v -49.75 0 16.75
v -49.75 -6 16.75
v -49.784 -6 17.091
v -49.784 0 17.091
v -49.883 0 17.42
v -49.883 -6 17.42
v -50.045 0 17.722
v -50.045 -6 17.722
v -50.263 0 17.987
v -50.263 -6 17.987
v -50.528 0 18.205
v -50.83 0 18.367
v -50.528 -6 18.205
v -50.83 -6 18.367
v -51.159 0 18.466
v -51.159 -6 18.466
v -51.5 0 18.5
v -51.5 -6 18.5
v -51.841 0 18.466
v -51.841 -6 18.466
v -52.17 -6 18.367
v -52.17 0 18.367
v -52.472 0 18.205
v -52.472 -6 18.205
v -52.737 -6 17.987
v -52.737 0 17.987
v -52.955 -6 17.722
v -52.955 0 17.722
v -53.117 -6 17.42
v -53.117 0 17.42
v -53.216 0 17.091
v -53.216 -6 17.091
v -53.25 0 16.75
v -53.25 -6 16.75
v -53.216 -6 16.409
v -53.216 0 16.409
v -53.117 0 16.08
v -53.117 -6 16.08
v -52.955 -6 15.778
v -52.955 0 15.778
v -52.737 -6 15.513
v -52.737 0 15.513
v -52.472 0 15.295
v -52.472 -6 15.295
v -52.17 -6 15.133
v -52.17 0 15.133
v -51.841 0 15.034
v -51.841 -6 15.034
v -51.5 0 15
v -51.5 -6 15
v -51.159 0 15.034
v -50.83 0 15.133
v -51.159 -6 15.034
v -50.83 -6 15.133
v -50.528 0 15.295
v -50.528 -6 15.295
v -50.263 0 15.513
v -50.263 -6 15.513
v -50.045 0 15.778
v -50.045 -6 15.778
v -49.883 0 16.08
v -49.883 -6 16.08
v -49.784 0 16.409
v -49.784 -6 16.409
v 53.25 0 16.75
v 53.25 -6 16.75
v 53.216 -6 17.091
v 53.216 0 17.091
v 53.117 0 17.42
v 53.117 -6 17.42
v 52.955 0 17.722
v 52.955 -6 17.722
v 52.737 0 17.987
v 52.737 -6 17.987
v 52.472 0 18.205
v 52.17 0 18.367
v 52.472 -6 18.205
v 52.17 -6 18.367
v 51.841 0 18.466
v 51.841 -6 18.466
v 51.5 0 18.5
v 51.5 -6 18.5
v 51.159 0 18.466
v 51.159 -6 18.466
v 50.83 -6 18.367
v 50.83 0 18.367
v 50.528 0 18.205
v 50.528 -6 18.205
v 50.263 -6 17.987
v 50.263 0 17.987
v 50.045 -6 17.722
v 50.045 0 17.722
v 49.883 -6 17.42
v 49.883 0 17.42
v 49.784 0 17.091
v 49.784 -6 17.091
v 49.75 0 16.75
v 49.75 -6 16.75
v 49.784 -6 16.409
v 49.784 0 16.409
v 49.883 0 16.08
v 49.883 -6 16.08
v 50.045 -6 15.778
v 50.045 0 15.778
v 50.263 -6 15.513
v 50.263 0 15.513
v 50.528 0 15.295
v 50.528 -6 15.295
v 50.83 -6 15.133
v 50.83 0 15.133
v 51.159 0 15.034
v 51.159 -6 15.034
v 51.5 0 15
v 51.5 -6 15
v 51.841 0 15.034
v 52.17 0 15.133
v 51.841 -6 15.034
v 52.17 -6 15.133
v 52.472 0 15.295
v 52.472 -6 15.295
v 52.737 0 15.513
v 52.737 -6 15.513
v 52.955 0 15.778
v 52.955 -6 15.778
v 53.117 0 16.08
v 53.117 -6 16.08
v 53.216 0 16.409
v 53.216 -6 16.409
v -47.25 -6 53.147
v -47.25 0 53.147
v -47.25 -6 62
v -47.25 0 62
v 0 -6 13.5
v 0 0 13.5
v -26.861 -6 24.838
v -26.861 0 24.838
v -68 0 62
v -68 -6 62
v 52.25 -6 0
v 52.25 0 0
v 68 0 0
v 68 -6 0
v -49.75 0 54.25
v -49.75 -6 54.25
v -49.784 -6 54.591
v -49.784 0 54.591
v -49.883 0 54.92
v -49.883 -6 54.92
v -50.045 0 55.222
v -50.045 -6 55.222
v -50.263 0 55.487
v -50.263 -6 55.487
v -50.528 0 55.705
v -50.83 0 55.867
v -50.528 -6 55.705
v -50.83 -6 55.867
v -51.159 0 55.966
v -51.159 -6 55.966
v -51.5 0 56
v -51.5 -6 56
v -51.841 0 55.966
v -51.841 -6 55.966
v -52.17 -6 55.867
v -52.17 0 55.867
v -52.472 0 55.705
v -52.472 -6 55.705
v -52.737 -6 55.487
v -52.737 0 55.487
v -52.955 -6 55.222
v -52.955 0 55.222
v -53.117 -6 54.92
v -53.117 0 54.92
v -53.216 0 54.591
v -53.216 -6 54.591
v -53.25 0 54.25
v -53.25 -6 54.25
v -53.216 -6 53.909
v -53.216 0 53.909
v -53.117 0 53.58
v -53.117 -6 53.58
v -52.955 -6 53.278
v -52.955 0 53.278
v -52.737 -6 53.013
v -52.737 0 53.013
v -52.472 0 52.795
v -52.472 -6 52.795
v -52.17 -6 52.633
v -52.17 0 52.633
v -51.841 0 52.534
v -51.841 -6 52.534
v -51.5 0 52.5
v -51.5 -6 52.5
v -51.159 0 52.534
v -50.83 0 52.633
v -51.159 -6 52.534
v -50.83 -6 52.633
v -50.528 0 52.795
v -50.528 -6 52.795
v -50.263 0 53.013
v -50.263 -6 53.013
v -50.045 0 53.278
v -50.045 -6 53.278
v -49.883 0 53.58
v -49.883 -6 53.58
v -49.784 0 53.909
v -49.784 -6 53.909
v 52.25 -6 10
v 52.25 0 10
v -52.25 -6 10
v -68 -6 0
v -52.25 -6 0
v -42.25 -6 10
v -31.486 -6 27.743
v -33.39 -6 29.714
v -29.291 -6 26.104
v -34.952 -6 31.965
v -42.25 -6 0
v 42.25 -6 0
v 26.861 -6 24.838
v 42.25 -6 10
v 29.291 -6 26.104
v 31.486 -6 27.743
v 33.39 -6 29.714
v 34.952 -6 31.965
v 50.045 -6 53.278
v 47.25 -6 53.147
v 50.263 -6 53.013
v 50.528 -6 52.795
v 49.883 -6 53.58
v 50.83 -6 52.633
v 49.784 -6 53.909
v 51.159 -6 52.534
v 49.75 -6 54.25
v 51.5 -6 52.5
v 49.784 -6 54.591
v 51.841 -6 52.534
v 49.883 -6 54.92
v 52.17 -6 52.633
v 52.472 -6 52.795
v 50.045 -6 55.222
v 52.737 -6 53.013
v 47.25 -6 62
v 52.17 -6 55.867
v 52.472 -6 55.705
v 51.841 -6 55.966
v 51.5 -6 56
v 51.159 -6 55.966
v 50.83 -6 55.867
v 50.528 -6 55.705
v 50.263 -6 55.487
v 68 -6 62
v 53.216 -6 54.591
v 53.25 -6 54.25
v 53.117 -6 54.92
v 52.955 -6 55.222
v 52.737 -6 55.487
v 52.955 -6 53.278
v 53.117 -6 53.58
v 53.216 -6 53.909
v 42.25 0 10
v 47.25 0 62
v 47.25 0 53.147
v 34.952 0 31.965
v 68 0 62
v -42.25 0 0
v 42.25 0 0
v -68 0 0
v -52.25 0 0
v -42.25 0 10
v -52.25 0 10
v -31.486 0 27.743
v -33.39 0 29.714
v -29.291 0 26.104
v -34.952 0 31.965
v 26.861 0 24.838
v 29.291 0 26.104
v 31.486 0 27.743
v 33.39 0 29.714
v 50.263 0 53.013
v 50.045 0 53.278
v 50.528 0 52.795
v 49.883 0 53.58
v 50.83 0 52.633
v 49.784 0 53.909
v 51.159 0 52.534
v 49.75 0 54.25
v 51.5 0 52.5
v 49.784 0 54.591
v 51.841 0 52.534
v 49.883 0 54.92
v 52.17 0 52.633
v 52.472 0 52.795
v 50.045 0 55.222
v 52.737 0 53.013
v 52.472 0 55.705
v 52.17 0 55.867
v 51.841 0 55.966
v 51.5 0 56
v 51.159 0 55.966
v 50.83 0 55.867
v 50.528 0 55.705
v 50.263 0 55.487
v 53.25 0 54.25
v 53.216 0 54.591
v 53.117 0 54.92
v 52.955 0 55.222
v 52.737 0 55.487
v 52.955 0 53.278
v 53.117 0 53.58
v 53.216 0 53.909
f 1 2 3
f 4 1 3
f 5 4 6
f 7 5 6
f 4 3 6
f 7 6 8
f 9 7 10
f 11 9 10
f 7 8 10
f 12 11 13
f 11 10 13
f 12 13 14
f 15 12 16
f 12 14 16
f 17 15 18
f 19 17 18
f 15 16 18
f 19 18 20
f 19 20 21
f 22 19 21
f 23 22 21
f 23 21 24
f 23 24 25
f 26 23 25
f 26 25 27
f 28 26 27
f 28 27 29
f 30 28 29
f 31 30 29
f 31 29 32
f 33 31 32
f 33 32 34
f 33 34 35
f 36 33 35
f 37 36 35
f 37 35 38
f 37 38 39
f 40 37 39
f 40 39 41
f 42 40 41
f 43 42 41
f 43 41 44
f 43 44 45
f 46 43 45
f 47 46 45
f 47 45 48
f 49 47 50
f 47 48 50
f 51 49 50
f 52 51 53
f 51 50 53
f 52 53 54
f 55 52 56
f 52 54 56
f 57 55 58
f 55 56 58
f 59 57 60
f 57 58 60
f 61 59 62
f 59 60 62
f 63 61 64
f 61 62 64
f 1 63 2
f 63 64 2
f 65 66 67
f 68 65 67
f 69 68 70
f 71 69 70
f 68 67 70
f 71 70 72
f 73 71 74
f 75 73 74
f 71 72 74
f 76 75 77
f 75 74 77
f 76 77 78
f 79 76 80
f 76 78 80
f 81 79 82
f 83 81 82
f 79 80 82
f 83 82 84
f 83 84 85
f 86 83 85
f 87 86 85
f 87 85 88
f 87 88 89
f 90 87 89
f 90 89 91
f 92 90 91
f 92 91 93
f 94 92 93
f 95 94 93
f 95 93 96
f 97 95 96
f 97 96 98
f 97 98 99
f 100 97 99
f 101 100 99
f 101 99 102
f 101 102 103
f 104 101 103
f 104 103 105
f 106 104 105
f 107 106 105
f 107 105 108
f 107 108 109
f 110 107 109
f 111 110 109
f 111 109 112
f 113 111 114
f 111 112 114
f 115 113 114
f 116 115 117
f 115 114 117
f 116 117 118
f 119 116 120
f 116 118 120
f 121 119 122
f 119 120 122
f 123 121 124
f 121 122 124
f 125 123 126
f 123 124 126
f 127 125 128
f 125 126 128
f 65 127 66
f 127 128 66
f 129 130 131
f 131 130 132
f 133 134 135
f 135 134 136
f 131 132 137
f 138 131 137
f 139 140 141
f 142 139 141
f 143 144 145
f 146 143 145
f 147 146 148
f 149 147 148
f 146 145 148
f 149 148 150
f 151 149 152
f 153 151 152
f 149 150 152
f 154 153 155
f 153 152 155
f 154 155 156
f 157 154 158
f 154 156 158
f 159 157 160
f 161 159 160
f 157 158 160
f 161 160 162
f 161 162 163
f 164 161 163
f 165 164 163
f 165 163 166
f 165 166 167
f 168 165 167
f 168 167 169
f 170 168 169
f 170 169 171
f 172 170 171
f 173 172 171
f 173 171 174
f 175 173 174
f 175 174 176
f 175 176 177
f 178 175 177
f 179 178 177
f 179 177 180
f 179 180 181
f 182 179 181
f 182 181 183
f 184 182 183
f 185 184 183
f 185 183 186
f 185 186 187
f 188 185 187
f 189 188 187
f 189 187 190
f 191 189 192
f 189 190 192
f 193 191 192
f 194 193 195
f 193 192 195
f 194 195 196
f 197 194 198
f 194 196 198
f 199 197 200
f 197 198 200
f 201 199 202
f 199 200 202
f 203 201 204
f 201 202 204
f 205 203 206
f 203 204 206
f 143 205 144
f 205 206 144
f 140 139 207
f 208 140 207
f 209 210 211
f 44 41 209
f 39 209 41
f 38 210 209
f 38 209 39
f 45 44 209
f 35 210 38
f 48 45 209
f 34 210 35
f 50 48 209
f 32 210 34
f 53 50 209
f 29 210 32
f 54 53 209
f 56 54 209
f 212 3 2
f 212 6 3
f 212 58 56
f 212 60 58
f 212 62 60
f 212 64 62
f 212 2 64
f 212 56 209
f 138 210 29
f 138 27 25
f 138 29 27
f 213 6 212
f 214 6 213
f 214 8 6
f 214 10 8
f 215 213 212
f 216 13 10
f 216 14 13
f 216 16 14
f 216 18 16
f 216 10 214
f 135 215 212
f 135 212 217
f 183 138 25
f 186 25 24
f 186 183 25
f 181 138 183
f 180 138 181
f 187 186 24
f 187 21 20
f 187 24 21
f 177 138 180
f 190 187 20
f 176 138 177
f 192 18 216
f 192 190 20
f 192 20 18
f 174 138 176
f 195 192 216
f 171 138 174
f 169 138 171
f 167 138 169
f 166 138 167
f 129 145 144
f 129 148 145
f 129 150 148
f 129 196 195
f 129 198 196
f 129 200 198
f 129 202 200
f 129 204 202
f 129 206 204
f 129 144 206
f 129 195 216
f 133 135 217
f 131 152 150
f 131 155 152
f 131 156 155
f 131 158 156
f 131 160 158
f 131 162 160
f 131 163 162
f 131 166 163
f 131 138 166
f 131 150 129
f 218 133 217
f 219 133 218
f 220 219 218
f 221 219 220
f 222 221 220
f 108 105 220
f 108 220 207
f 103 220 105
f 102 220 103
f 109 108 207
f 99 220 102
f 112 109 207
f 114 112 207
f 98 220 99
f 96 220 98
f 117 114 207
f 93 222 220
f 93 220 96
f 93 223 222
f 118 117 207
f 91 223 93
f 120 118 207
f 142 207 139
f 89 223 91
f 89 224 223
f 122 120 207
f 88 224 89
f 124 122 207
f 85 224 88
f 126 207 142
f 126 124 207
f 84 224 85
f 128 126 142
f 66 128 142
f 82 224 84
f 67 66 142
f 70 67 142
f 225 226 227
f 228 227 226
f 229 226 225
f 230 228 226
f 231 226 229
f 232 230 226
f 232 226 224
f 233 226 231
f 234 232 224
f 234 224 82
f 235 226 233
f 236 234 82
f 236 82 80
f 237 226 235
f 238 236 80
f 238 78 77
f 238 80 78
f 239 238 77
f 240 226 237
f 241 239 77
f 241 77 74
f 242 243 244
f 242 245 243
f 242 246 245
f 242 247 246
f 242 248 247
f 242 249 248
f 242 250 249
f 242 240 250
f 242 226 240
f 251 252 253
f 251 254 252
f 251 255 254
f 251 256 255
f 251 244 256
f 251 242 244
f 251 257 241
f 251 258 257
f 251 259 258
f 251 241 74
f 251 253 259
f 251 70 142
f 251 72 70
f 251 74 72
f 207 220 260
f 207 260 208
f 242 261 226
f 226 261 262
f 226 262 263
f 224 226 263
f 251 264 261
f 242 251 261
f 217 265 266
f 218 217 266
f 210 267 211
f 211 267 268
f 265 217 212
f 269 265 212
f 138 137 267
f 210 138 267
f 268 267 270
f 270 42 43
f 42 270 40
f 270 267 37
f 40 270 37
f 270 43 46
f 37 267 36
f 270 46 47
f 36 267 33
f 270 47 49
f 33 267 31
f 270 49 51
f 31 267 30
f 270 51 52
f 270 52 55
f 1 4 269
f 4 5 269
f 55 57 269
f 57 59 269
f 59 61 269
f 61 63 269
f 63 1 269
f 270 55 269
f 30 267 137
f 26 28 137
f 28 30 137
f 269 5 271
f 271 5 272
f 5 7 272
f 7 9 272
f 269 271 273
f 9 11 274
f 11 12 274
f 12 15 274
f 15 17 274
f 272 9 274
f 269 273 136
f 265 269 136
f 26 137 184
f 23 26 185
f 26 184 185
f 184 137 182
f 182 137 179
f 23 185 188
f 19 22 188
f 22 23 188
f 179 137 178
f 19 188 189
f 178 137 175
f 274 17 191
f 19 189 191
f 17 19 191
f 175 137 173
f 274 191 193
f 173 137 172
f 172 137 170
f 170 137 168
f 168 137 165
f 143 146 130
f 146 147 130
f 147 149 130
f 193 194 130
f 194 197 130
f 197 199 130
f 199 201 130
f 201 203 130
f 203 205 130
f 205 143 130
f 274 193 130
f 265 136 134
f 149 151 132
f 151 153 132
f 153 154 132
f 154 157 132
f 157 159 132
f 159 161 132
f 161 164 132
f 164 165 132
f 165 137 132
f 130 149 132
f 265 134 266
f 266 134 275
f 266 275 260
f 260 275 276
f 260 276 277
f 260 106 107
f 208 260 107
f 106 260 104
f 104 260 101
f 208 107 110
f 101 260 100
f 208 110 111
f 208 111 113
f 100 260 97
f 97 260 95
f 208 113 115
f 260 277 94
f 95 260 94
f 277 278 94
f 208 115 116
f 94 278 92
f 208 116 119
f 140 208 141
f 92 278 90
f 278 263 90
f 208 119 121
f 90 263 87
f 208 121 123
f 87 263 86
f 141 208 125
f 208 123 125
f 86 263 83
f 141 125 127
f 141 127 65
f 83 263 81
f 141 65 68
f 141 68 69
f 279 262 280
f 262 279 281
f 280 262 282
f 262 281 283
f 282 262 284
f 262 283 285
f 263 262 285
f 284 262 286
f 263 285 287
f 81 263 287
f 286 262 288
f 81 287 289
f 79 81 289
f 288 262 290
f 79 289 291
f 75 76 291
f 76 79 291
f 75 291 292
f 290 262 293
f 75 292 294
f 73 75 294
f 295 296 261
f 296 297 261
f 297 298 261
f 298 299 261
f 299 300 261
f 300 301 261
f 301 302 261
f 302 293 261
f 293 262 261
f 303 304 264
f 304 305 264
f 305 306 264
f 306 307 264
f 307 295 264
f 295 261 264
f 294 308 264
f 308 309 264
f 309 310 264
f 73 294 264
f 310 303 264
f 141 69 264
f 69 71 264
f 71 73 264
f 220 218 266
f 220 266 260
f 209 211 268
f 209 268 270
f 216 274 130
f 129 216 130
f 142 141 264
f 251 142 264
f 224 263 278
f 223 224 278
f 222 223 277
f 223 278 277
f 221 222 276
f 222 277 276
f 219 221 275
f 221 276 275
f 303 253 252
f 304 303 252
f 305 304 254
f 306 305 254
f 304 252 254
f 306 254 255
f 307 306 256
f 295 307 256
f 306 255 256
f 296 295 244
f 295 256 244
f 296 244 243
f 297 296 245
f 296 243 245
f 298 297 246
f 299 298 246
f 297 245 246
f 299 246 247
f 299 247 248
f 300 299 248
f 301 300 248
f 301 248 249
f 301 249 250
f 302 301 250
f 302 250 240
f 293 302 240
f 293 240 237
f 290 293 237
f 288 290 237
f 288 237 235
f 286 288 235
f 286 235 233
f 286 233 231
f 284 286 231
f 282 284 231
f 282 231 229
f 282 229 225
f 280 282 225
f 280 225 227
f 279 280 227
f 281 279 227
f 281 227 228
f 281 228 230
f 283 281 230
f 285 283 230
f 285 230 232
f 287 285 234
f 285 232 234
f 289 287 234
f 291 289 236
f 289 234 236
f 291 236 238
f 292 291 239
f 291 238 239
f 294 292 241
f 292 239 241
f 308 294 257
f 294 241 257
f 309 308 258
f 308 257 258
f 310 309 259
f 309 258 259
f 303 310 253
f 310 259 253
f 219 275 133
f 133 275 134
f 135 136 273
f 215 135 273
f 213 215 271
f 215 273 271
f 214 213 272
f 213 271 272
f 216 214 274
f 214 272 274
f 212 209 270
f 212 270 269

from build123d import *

# Parameters (mm, degrees)
F1_DEPTH = 6
F2_R     = 1.75
F3_DEPTH = 6.001
F4_W     = 10
F4_H     = 10
F5_DEPTH = 6.001


with BuildPart() as f1:
    # F0 (on Front) → F1 (new body)
    with BuildSketch(Plane.XZ):
        with BuildLine():
            Line((-68, 0), (0, 0))
            Line((0, 0), (68, 0))
            Line((68, 0), (68, 62))
            Line((68, 62), (47.25, 62))
            Line((47.25, 62), (47.25, 53.147458))
            Line((47.25, 53.147458), (34.951913, 31.964558))
            ThreePointArc((34.951913, 31.964558), (31.486373, 27.742888), (26.860942, 24.838089))
            Line((26.860942, 24.838089), (0, 13.5))
            Line((0, 13.5), (-26.860942, 24.838089))
            ThreePointArc((-26.860942, 24.838089), (-31.486373, 27.742888), (-34.951913, 31.964558))
            Line((-34.951913, 31.964558), (-47.25, 53.147458))
            Line((-47.25, 53.147458), (-47.25, 62))
            Line((-47.25, 62), (-68, 62))
            Line((-68, 62), (-68, 0))
        make_face()
    extrude(amount=F1_DEPTH)

    # F2 (on face) → F3 (cut, through all)
    with BuildSketch(Plane.XZ.offset(6)):
        with Locations((-51.5, 54.25)):
            Circle(F2_R)
        with Locations((-51.5, 16.75)):
            Circle(F2_R)
        with Locations((51.5, 54.25)):
            Circle(F2_R)
        with Locations((51.5, 16.75)):
            Circle(F2_R)
    extrude(amount=-F3_DEPTH, mode=Mode.SUBTRACT)

    # F4 (on face) → F5 (cut, through all)
    with BuildSketch(Plane.XZ.offset(6)):
        with Locations((-47.25, 5)):
            Rectangle(F4_W, F4_H)
        with Locations((47.25, 5)):
            Rectangle(F4_W, F4_H)
    extrude(amount=-F5_DEPTH, mode=Mode.SUBTRACT)


solid = f1.part
